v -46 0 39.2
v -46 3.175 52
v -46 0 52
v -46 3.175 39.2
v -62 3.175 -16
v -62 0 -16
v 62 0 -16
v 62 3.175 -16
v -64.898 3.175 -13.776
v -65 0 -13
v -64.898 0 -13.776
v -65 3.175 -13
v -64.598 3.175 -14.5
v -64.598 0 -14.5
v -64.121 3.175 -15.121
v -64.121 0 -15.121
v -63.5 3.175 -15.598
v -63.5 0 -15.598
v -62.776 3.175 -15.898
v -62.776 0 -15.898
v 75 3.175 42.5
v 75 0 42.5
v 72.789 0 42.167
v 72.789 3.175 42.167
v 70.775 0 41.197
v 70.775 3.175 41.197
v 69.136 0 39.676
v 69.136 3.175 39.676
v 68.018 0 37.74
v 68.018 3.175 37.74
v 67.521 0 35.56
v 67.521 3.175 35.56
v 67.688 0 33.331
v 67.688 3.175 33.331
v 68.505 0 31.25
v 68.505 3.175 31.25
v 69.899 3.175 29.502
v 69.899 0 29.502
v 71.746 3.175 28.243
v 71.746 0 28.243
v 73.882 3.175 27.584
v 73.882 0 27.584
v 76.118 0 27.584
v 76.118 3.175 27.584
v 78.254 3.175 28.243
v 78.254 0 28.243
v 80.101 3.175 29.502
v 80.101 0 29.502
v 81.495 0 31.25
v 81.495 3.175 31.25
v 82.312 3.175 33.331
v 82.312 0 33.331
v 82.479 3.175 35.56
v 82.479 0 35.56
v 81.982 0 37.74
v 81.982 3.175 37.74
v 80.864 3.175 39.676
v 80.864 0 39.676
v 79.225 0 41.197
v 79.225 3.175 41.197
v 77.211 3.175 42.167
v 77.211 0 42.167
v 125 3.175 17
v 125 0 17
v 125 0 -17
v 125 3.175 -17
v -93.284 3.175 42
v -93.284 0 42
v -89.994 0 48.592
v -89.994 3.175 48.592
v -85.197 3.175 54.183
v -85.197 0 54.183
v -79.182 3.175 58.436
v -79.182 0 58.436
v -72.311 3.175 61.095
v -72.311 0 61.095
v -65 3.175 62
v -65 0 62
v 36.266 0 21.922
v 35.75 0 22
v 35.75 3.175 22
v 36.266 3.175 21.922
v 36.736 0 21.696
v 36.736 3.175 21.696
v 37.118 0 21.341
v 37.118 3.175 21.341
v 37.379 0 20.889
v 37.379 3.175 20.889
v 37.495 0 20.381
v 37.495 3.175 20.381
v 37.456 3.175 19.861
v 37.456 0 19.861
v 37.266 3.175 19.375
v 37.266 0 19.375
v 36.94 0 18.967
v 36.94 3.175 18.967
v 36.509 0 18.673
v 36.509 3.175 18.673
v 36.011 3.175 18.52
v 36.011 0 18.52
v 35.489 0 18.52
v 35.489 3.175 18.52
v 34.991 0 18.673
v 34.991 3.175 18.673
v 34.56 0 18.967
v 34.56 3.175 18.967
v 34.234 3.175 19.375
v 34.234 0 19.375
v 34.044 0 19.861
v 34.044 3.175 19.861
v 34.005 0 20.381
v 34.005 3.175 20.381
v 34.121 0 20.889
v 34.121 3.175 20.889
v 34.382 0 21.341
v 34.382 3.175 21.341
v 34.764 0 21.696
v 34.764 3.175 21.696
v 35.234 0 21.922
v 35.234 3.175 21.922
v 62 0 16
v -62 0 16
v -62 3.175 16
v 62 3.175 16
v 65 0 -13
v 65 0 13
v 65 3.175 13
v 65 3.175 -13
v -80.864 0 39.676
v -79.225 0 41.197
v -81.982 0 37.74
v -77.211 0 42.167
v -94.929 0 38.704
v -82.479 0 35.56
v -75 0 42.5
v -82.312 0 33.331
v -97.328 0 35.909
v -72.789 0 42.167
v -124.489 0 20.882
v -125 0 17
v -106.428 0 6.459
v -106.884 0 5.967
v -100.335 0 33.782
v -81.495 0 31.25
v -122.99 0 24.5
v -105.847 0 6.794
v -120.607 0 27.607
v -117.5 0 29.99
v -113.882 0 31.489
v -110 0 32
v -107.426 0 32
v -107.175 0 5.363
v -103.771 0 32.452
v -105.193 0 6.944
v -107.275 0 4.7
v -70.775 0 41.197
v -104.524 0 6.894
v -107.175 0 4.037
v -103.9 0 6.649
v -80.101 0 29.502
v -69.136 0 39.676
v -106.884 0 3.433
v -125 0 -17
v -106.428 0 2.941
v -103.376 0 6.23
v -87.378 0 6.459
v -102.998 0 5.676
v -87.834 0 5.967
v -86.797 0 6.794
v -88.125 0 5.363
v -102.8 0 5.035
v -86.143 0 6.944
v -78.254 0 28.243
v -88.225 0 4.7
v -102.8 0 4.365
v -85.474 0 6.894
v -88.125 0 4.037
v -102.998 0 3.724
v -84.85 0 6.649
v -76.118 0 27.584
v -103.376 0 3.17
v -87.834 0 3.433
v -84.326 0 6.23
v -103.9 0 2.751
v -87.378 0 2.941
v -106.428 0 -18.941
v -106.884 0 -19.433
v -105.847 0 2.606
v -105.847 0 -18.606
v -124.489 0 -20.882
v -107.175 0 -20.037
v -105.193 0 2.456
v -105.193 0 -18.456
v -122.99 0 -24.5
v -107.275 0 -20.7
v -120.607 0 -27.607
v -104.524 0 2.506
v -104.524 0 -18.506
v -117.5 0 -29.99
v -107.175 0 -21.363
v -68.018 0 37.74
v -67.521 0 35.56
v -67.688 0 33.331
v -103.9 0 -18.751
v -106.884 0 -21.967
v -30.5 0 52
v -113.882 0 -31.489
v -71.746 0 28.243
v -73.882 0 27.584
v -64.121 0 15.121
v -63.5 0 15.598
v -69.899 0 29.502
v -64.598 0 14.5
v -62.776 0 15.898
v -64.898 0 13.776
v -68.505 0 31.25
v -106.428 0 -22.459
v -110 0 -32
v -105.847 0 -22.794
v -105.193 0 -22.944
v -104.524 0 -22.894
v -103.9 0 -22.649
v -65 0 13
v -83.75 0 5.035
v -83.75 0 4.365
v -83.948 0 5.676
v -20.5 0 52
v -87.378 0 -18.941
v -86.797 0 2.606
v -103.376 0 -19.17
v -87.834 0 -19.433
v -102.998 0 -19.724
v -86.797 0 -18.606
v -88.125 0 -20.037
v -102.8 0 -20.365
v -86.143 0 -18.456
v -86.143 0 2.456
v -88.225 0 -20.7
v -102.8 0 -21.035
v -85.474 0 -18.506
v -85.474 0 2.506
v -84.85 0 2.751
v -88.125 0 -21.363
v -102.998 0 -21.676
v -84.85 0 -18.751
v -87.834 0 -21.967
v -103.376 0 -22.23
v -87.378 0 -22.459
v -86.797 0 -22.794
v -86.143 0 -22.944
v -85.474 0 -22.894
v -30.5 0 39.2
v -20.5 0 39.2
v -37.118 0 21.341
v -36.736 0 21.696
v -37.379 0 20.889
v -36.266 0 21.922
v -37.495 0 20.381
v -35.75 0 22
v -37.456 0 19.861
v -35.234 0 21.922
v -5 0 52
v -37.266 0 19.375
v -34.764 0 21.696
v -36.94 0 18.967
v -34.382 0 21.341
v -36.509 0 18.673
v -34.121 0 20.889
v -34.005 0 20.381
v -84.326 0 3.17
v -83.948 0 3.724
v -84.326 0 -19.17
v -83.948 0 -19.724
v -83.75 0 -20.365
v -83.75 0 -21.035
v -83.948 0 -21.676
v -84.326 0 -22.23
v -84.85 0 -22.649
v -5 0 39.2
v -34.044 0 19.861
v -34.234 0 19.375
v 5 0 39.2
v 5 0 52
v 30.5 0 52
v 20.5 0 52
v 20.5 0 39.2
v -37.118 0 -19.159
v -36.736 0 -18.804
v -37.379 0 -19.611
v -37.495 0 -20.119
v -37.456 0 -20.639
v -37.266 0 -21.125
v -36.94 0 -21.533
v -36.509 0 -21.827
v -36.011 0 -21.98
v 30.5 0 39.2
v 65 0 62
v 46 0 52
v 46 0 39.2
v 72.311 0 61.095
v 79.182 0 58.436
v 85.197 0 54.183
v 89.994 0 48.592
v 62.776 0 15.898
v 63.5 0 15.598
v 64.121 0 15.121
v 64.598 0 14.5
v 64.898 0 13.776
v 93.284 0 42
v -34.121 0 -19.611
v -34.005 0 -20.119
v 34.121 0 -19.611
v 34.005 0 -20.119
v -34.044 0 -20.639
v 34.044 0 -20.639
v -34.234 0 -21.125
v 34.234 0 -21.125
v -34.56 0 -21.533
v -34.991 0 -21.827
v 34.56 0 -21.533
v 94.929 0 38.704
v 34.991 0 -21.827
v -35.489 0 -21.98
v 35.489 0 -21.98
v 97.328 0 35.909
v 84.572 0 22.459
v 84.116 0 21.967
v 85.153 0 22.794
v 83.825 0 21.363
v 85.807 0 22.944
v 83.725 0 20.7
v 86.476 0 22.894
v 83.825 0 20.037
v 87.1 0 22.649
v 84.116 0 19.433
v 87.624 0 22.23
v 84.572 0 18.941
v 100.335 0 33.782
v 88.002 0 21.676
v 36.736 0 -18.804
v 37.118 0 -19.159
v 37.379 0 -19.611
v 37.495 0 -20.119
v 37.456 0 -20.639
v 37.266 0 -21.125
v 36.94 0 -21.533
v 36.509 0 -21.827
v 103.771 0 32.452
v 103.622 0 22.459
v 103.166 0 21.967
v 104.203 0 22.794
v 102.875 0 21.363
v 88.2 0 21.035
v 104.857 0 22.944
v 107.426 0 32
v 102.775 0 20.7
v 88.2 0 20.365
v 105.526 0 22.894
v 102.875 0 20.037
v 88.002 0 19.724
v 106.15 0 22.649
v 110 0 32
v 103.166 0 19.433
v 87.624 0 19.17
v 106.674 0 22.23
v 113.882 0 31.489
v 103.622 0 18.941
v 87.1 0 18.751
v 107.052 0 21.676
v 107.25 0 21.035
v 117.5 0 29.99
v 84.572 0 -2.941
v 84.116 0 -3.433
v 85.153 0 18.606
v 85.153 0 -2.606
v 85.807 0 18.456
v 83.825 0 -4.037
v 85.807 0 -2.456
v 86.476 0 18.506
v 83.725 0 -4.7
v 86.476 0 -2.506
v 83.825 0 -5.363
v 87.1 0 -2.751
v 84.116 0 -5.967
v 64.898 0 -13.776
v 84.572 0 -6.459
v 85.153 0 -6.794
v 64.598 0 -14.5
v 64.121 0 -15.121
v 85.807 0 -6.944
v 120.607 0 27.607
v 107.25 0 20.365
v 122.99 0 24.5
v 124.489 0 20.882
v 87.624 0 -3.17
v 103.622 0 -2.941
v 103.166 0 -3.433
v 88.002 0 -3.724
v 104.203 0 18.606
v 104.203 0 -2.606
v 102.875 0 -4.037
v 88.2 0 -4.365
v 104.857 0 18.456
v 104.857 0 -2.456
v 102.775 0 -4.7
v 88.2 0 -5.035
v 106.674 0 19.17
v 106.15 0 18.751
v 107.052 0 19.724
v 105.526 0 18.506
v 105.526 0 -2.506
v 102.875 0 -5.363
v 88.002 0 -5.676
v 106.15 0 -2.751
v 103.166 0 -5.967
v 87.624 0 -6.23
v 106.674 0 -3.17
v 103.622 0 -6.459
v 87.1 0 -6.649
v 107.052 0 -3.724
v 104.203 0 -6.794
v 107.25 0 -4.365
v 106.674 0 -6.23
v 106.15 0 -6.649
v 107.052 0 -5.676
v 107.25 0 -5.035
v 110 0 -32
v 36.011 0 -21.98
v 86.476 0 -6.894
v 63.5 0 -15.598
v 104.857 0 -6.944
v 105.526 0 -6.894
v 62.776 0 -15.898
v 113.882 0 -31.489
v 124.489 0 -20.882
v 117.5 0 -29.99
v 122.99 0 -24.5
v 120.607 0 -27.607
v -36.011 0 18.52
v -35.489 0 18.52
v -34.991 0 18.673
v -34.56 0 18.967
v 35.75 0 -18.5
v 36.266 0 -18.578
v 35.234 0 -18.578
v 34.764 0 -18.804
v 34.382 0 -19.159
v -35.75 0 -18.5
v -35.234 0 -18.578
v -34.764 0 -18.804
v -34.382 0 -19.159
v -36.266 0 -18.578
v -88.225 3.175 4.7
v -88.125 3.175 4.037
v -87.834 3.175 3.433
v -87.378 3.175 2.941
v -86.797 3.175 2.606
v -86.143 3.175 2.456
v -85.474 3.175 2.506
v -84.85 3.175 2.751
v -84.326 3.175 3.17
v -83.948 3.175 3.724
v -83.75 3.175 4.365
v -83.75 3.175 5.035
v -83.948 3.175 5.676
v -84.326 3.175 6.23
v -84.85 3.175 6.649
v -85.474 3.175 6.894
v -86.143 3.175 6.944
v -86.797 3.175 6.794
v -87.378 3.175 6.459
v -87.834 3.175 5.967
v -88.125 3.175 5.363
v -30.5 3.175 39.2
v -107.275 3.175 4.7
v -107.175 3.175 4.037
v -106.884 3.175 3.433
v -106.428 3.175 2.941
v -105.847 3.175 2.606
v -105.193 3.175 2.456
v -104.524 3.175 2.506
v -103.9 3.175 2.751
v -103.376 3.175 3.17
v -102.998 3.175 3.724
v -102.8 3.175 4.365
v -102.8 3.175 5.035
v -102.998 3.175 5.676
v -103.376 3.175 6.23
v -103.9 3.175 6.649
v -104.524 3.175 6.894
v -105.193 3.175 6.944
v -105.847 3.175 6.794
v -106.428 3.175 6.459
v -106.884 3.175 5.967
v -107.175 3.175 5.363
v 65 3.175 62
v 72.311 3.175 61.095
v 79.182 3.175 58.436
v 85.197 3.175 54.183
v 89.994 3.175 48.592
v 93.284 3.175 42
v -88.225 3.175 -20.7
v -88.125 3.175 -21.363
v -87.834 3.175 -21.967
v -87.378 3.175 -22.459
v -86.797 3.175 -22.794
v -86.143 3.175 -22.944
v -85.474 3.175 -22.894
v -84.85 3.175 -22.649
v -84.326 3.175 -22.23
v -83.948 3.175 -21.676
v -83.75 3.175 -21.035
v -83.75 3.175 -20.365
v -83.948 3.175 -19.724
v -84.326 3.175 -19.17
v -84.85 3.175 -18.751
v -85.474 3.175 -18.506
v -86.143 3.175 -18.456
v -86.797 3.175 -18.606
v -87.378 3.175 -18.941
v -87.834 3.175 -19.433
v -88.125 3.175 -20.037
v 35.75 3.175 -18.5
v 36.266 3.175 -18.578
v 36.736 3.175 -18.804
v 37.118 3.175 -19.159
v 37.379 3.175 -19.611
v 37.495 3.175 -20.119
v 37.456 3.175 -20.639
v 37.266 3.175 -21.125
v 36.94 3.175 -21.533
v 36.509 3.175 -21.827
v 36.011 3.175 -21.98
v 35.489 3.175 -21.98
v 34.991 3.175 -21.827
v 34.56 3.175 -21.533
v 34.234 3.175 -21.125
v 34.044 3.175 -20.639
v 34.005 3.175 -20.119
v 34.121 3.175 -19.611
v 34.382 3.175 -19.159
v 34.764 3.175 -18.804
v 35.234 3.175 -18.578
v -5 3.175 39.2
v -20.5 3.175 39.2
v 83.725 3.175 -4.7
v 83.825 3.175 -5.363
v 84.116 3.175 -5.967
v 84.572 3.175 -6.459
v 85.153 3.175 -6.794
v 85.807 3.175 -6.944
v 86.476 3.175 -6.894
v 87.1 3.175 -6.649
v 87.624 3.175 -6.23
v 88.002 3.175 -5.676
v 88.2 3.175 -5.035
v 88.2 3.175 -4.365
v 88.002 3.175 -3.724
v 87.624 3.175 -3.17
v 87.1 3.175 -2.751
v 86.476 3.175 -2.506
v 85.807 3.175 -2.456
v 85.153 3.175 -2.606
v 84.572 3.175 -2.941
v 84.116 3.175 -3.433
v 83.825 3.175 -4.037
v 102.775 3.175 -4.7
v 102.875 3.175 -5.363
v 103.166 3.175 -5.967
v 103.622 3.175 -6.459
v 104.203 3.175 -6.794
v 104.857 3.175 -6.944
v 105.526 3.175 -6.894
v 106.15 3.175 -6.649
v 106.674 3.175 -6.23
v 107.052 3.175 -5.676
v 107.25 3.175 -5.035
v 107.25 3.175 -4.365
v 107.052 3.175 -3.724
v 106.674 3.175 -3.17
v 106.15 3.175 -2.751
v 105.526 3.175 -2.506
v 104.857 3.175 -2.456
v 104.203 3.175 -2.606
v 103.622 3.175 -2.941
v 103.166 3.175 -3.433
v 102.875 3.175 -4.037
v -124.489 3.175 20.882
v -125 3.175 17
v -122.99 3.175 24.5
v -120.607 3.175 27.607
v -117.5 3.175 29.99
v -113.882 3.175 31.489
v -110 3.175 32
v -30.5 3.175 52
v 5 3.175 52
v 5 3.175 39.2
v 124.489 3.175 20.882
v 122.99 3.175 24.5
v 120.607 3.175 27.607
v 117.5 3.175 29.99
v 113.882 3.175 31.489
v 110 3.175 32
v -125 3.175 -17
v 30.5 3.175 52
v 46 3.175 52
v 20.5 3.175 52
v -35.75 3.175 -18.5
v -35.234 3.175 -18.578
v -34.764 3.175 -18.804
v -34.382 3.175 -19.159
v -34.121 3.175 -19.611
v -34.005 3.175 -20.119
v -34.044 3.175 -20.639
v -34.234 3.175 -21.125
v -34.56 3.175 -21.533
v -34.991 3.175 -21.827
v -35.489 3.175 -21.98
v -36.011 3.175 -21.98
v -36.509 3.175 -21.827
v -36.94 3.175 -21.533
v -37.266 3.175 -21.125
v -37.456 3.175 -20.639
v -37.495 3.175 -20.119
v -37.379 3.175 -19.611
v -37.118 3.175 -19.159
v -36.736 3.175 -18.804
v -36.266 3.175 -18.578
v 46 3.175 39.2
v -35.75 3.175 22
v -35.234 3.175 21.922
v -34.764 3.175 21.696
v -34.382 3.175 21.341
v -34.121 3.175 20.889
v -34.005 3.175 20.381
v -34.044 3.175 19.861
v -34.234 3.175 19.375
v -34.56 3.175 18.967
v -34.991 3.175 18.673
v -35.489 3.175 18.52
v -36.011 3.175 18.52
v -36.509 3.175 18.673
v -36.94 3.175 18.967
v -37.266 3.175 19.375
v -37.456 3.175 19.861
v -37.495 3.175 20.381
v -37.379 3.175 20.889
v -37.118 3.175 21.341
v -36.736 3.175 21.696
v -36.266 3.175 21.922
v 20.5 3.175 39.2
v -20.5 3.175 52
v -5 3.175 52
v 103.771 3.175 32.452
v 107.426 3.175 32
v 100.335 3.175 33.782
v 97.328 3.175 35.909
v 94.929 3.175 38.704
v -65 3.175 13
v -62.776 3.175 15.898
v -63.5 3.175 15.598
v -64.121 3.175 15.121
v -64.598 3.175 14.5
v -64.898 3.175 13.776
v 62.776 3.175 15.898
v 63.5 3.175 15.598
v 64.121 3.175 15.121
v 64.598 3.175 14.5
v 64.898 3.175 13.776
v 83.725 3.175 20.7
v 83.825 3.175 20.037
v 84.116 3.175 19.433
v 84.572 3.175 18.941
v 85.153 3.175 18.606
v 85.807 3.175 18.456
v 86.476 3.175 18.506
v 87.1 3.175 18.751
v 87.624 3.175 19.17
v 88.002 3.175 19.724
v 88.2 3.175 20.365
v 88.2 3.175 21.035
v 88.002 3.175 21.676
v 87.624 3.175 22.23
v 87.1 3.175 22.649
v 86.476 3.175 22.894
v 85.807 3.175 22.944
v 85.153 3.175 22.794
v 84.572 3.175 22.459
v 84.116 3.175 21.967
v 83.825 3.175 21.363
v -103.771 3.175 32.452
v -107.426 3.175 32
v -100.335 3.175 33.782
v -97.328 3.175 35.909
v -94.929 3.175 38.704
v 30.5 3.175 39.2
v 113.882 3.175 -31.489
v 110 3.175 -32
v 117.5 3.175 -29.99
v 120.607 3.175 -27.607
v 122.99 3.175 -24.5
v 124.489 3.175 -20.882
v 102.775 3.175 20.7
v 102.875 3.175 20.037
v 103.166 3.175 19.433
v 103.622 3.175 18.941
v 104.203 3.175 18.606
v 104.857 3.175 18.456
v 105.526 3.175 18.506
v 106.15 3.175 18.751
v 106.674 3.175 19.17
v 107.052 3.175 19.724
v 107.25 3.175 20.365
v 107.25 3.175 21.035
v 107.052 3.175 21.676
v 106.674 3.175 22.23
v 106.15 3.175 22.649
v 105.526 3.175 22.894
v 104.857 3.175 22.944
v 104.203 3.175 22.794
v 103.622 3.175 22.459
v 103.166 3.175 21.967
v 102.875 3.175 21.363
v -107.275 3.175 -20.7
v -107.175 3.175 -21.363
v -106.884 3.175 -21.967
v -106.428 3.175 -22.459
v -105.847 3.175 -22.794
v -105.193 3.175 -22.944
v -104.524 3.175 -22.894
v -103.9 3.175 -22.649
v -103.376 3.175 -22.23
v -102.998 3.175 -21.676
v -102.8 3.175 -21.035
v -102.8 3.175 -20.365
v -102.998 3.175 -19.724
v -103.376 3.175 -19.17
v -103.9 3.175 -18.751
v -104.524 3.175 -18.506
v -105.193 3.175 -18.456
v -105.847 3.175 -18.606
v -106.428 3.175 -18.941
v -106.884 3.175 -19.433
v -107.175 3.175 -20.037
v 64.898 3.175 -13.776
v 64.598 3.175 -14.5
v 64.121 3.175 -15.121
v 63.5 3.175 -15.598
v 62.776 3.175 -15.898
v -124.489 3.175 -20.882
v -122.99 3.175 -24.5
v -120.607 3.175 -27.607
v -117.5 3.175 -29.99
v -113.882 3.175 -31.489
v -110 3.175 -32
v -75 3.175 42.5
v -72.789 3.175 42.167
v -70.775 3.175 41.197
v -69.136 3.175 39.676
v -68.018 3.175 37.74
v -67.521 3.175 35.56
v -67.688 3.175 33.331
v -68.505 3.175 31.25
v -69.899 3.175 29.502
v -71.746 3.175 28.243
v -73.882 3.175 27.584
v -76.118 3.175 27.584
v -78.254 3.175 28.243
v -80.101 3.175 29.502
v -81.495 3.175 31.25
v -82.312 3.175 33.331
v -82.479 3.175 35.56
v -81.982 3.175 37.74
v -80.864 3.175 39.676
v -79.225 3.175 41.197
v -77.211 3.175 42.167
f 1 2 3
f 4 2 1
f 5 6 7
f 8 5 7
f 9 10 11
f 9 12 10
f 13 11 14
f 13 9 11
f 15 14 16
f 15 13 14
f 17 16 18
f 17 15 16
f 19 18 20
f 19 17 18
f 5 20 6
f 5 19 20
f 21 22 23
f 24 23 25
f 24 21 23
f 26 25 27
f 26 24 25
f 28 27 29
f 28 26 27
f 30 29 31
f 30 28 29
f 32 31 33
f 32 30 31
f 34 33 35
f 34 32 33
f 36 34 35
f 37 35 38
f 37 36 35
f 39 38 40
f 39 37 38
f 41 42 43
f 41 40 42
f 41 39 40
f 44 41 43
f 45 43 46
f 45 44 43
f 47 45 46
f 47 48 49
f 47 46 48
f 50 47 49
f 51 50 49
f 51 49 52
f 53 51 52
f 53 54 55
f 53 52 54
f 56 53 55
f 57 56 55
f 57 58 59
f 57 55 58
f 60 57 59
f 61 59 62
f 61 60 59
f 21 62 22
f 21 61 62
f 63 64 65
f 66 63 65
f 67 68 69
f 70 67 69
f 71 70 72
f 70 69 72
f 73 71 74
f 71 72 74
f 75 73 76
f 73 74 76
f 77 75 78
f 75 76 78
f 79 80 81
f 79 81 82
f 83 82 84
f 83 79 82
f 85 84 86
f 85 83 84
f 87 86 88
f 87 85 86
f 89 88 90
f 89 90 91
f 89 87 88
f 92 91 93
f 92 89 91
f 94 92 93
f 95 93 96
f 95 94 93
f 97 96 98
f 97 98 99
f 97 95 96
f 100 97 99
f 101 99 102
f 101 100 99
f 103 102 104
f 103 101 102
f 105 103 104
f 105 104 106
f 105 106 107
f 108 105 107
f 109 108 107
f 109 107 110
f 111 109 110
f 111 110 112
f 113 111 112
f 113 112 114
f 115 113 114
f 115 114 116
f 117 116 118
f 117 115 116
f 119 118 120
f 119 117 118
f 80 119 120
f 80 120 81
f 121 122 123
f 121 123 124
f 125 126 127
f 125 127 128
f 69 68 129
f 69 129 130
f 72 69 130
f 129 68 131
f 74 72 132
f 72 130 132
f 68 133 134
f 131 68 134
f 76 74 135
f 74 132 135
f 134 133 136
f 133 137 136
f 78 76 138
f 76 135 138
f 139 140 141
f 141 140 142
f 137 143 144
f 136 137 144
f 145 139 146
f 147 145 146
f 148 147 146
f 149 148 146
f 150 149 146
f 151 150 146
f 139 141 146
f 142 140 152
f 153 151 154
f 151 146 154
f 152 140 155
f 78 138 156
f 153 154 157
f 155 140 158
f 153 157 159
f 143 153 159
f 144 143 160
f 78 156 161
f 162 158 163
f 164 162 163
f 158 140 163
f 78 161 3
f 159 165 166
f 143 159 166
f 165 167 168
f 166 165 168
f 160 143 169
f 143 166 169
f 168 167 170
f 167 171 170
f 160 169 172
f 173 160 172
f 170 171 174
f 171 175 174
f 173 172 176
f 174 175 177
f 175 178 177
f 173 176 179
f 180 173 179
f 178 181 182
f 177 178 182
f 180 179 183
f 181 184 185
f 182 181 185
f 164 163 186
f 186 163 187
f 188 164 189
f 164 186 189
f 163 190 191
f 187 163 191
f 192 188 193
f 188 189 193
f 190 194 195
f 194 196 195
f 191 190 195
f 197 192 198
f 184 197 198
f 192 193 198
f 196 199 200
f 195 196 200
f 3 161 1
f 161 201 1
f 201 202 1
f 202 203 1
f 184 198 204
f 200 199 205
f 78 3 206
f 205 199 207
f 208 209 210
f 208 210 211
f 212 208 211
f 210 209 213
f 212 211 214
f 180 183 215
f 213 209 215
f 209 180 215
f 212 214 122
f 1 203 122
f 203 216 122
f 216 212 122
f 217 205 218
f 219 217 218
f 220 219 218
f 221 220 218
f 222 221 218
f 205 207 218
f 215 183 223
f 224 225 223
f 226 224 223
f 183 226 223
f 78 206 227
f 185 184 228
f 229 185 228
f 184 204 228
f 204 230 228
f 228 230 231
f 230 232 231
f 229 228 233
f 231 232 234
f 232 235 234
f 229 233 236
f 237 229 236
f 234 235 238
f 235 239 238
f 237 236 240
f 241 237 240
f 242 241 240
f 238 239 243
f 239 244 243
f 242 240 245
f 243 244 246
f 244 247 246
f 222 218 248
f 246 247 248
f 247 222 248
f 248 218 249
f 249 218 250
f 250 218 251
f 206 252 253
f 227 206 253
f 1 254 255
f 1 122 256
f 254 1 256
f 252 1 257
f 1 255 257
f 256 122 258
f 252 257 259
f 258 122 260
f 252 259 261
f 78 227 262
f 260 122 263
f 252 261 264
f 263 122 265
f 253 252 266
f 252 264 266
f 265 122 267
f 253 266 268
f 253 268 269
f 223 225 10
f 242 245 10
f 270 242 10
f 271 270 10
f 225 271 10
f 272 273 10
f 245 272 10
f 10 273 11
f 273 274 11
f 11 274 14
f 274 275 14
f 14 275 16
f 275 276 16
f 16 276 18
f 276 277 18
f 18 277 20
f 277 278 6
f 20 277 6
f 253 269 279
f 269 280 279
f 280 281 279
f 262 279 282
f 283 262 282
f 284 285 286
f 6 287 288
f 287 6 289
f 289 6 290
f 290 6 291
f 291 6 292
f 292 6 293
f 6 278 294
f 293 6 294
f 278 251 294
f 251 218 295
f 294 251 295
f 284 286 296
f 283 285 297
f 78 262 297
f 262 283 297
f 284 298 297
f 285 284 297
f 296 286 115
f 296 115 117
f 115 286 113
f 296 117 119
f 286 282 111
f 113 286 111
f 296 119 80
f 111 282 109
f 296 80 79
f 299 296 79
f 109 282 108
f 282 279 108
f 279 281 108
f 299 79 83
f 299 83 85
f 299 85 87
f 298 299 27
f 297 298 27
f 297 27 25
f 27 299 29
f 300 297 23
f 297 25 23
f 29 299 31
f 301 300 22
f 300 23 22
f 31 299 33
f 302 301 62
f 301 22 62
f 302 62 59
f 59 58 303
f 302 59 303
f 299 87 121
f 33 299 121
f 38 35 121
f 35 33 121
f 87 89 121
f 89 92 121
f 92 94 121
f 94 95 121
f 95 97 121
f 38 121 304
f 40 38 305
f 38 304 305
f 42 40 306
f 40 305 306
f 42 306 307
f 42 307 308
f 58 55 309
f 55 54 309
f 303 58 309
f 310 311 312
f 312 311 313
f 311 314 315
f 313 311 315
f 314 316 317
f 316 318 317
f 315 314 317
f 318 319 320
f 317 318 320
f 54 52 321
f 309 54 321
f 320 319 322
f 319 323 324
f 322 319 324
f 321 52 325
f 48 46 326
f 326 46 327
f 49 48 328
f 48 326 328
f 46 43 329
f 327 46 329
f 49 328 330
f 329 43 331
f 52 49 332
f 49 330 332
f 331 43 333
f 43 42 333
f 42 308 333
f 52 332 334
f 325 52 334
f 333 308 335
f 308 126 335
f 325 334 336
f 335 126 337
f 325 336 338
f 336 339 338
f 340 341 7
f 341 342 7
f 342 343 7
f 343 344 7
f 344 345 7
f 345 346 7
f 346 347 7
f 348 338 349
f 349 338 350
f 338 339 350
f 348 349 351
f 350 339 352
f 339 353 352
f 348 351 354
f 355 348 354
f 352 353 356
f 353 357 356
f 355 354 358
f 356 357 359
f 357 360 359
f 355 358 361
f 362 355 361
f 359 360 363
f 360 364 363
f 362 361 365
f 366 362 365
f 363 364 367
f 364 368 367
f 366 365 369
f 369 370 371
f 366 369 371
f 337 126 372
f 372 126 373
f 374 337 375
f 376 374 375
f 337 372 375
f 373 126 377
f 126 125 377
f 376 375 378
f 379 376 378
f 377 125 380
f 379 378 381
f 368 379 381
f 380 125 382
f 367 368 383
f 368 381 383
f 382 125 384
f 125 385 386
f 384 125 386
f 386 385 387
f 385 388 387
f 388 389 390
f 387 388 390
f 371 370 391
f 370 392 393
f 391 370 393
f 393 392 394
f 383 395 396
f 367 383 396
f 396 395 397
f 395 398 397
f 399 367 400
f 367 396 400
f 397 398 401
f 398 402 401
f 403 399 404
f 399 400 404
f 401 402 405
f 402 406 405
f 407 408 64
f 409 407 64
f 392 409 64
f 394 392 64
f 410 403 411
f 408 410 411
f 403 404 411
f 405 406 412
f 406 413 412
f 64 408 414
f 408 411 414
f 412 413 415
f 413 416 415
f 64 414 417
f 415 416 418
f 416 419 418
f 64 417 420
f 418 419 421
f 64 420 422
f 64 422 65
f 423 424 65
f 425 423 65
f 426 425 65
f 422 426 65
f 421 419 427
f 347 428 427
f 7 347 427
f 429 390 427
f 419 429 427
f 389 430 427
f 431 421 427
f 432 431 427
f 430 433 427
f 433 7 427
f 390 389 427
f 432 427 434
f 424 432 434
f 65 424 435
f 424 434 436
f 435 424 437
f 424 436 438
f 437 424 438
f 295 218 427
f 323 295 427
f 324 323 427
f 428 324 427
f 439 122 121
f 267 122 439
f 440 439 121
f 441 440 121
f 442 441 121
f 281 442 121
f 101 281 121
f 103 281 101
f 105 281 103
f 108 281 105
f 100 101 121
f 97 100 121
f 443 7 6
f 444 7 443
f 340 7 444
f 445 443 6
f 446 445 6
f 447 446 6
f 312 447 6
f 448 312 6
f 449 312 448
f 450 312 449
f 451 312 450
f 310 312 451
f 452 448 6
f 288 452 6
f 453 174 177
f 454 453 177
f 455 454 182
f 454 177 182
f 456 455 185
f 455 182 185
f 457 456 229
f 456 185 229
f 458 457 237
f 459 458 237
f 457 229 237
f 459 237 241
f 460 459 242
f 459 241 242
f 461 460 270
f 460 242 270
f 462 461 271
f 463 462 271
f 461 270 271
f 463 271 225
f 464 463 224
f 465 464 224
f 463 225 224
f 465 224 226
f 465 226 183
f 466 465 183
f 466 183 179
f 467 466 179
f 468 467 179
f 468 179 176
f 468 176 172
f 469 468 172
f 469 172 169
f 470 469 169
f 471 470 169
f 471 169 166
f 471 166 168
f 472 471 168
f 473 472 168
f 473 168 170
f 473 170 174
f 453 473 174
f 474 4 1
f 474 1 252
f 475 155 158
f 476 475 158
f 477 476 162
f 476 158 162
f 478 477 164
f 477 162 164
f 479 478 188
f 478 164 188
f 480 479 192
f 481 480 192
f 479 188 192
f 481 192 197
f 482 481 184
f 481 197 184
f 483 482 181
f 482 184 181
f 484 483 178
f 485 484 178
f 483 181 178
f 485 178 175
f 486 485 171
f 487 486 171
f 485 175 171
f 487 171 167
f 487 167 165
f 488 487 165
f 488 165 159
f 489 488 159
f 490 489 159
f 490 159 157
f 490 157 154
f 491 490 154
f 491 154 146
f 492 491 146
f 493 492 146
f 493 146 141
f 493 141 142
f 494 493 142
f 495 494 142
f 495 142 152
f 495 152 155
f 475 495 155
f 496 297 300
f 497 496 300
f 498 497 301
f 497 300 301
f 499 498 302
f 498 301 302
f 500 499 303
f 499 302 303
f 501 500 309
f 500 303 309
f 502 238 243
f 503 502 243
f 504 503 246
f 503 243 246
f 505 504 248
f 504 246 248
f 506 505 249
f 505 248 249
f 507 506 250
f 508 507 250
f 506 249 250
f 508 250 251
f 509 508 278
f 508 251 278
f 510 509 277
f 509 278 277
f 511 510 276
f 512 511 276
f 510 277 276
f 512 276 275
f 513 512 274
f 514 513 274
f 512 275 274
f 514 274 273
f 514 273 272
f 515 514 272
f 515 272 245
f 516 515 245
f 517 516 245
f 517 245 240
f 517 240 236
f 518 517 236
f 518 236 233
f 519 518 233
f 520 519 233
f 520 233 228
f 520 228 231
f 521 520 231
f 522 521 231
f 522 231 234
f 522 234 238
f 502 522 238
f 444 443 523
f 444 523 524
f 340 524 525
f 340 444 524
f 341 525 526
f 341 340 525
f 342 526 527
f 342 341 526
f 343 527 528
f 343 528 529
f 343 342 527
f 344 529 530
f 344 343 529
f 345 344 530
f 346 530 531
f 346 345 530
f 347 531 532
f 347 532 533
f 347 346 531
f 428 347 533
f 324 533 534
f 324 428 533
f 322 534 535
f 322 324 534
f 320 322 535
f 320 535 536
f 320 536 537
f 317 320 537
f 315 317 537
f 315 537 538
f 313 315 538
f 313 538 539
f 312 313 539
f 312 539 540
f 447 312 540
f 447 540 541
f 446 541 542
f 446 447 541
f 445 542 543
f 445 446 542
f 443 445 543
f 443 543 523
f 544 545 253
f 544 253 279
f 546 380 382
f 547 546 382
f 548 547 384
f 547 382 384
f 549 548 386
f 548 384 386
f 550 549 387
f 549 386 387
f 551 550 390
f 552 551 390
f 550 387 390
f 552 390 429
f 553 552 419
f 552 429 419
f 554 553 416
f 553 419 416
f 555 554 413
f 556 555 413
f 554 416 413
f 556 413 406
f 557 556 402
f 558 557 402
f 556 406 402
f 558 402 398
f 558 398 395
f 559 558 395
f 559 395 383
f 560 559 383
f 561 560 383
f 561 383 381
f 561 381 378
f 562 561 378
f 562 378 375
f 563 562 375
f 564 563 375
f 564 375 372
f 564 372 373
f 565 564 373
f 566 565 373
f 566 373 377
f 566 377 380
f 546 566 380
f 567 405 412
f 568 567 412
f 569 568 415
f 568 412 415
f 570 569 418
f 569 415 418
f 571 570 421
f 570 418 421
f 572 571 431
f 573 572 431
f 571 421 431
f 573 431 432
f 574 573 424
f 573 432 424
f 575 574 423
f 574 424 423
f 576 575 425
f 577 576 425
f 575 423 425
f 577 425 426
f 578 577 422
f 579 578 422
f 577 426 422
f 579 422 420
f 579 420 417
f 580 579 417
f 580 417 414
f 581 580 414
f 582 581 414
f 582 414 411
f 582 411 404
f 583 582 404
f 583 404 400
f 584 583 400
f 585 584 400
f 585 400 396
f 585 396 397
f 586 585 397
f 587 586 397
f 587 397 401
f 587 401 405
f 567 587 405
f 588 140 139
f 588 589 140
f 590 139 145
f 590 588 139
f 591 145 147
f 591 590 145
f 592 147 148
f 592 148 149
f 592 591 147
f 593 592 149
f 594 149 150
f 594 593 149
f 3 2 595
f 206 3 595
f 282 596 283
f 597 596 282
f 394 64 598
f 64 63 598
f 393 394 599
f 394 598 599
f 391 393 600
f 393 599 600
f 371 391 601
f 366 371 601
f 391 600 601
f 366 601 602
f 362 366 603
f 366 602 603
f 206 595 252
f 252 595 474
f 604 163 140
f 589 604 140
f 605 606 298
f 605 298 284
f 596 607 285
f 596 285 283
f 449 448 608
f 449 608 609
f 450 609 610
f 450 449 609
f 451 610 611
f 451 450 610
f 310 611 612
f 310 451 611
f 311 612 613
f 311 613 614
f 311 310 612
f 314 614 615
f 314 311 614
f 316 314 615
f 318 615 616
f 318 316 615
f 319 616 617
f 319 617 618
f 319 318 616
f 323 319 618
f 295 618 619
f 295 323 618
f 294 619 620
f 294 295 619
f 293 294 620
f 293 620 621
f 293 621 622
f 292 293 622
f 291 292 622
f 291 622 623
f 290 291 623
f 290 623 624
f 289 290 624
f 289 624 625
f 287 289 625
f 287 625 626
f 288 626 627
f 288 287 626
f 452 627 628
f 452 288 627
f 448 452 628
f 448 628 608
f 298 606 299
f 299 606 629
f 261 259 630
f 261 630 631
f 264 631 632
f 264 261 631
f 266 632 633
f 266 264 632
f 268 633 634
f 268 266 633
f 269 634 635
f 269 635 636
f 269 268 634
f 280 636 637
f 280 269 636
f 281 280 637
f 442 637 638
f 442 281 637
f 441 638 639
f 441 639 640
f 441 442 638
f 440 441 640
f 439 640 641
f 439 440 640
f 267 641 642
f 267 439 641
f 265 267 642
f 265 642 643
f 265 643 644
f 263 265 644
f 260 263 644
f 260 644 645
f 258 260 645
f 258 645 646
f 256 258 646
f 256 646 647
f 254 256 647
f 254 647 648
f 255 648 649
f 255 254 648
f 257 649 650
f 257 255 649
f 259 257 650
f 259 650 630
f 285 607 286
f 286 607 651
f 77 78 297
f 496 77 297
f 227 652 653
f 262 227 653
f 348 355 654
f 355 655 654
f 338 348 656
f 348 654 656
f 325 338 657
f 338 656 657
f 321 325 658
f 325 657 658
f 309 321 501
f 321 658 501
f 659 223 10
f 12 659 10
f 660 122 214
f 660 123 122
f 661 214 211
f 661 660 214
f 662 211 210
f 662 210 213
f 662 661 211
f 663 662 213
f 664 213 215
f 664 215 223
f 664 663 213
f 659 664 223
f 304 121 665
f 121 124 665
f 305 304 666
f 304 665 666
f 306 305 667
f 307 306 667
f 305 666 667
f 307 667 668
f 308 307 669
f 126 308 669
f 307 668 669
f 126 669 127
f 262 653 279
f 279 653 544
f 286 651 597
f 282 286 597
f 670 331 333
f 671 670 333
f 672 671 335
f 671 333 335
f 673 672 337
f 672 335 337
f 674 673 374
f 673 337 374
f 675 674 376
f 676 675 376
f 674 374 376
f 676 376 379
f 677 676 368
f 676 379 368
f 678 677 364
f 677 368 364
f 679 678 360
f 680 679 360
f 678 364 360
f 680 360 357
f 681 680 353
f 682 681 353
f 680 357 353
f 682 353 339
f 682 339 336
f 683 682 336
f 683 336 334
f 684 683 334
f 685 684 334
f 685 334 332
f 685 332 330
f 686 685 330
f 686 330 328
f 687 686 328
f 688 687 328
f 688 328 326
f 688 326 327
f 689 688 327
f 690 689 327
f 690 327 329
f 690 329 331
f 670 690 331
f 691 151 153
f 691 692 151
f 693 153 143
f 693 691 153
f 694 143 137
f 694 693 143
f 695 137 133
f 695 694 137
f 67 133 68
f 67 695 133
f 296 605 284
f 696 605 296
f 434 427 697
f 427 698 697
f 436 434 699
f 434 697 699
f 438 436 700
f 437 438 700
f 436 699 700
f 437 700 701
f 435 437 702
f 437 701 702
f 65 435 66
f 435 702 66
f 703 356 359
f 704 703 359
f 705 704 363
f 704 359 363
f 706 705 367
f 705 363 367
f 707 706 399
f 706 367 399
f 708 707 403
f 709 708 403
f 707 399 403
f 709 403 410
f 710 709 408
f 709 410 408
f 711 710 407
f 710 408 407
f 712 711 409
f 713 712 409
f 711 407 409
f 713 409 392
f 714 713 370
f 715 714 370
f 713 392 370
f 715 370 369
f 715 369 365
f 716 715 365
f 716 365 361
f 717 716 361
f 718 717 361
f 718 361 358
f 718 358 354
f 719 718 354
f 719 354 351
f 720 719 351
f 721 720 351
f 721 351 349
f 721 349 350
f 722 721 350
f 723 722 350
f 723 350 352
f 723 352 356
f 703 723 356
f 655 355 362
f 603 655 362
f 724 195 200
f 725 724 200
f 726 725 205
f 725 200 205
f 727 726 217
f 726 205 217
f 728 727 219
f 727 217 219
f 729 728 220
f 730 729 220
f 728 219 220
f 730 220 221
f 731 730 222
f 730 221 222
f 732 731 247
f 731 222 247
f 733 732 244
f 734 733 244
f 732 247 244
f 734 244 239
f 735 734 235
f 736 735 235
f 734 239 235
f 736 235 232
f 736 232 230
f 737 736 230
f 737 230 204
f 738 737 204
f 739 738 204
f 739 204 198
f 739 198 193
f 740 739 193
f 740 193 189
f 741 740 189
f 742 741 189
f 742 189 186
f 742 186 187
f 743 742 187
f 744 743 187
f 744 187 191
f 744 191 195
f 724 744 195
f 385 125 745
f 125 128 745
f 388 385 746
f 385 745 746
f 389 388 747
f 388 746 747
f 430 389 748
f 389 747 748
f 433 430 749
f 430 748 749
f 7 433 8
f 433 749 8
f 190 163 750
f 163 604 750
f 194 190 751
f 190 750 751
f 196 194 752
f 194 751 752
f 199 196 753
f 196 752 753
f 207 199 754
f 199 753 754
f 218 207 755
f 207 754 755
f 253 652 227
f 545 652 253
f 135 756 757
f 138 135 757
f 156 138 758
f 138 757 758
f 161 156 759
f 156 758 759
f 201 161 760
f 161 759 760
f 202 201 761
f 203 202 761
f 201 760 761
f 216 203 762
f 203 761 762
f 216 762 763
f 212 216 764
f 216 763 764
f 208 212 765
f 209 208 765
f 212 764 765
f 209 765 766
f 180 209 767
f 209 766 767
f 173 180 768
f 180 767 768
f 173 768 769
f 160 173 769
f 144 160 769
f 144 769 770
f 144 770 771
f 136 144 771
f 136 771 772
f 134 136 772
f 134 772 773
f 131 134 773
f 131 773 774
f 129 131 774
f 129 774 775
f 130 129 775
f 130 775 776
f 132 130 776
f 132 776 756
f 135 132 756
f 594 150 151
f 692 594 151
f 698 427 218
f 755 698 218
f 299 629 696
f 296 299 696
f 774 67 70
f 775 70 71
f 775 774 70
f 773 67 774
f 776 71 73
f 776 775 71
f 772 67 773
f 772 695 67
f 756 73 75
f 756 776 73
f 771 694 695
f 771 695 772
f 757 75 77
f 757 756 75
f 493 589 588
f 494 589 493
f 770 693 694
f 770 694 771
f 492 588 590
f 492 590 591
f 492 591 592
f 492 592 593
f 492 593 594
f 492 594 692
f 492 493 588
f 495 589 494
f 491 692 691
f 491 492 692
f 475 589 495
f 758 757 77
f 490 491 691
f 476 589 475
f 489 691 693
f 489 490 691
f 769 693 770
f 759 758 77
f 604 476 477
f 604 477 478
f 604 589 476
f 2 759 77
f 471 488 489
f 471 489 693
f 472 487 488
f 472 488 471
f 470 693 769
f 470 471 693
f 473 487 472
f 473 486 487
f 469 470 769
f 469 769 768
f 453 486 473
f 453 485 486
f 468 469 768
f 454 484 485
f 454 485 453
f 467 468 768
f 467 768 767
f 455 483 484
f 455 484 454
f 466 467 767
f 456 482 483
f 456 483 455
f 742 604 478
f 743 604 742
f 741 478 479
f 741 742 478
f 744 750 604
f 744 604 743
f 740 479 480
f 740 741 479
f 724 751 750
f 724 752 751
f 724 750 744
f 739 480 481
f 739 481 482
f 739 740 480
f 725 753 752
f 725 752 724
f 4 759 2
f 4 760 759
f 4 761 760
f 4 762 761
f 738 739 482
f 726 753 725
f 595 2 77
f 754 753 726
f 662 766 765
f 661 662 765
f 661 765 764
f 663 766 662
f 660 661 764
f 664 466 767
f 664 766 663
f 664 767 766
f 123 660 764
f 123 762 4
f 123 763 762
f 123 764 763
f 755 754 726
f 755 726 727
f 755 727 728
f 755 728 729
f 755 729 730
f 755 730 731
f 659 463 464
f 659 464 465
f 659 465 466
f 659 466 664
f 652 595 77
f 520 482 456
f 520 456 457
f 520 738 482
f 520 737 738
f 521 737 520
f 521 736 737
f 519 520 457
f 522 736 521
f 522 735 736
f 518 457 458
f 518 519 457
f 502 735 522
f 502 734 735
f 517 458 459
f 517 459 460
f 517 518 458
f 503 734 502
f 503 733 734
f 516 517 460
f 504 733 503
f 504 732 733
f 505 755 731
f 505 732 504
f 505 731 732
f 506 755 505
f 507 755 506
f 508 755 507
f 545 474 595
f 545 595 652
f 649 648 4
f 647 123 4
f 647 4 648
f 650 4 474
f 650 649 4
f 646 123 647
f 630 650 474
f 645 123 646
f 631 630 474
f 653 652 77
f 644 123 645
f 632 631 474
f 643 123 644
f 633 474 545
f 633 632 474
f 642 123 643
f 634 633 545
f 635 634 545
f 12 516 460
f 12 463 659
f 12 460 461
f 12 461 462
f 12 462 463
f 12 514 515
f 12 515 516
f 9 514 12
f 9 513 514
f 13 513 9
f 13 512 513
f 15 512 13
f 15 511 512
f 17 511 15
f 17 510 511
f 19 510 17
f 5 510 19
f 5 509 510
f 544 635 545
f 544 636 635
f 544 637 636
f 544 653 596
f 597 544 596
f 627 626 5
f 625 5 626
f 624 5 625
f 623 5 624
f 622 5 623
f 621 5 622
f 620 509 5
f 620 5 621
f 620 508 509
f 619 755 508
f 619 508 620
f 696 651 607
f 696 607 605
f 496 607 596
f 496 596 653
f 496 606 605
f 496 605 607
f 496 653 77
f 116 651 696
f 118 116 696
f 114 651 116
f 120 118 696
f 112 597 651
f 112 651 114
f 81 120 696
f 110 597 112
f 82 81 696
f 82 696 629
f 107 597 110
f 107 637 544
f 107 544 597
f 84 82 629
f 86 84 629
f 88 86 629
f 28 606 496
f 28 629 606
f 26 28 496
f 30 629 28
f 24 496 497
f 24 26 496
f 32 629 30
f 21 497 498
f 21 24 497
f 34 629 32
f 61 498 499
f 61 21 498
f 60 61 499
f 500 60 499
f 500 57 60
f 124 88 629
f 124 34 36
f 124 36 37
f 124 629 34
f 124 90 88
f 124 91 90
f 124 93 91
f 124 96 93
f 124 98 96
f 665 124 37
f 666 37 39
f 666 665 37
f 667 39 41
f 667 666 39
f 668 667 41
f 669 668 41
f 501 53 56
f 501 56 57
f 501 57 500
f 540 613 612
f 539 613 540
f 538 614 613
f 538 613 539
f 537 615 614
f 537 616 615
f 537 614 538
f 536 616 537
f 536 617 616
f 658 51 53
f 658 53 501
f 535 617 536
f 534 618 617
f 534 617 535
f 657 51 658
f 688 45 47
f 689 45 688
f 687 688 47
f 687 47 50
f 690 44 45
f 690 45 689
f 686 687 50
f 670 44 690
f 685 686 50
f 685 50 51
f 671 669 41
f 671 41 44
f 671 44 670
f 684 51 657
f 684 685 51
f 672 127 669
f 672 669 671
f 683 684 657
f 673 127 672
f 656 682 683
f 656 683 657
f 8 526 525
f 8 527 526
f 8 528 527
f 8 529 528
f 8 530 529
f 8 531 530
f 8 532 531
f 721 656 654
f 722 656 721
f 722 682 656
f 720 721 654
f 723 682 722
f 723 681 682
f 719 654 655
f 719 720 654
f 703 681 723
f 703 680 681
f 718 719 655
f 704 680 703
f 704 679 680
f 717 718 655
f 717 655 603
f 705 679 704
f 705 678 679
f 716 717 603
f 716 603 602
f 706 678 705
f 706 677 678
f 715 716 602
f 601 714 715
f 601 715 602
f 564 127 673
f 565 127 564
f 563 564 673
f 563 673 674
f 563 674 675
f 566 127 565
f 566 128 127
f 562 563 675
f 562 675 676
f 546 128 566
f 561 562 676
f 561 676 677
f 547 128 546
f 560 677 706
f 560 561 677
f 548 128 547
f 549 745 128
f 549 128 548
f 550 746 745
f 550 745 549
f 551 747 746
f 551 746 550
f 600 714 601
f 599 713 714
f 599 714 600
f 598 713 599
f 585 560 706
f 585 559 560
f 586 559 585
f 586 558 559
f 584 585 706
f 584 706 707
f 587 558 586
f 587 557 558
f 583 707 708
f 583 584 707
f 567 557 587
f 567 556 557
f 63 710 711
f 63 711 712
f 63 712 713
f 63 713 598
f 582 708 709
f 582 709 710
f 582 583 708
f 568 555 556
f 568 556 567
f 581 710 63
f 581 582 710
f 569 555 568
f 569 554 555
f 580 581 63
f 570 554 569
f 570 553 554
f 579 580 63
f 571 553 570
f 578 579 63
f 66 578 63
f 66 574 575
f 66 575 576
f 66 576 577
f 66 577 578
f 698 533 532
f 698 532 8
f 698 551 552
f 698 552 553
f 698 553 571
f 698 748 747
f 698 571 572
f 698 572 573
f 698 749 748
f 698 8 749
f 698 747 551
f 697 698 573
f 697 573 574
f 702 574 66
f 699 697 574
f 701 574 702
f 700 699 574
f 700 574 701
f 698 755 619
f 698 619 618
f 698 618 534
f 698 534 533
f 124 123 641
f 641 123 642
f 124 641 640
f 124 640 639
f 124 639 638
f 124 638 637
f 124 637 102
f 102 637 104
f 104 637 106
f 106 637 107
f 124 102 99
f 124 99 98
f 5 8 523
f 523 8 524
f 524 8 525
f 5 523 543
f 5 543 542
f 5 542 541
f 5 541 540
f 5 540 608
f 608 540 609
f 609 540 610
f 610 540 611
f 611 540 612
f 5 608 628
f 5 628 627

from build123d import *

# Parameters (mm, degrees)
SKETCH3_W            = 130
SKETCH3_H            = 32
SKETCH3_R            = 1.75
BOSS_EXTRUDE1_DEPTH  = 3.175
M4_CLEARANCE_HOLE1_D = 4.5
FILLET1_R            = 15
SKETCH6_W            = 15.5
SKETCH6_H            = 12.8
CUT_EXTRUDE1_DEPTH   = 140.56747696
SKETCH7_R            = 7.5
CUT_EXTRUDE2_DEPTH   = 140.56747696
FILLET2_R            = 3


with BuildPart() as part:
    # Sketch3 → Boss-Extrude1 (new body)
    with BuildSketch(Plane(origin=(0, 0, 0), x_dir=(1, 0, 0), z_dir=(0, 1, 0))):
        with BuildLine():
            Line((-125, 32), (-125, -32))
            Line((-125, -32), (-95, -32))
            ThreePointArc((-95, -32), (-86.213203436, -53.213203436), (-65, -62))
            Line((-65, -62), (65, -62))
            ThreePointArc((65, -62), (86.213203436, -53.213203436), (95, -32))
            Line((95, -32), (125, -32))
            Line((125, -32), (125, 32))
            Line((125, 32), (-125, 32))
        make_face()
        Rectangle(SKETCH3_W, SKETCH3_H, mode=Mode.SUBTRACT)
        with Locations(Location((-35.75, 20.25, 0), (0, 0, 270))):
            Circle(SKETCH3_R, mode=Mode.SUBTRACT)
        with Locations(Location((35.75, 20.25, 0), (0, 0, 270))):
            Circle(SKETCH3_R, mode=Mode.SUBTRACT)
        with Locations(Location((-35.75, -20.25, 0), (0, 0, 270))):
            Circle(SKETCH3_R, mode=Mode.SUBTRACT)
        with Locations(Location((35.75, -20.25, 0), (0, 0, 270))):
            Circle(SKETCH3_R, mode=Mode.SUBTRACT)
    extrude(amount=BOSS_EXTRUDE1_DEPTH)

    # M4 Clearance Hole1 (through all)
    with Locations(Plane(origin=(0, 3.175, 0), x_dir=(1, 0, 0), z_dir=(0, 1, 0))):
        with Locations((-105.025, 20.7), (-85.975, 20.7), (-105.025, -4.7), (-85.975, -4.7), (85.975, 4.7), (105.025, 4.7), (105.025, -20.7), (85.975, -20.7)):
            Hole(M4_CLEARANCE_HOLE1_D / 2)

    # Fillet1
    fillet1_edges = [part.edges().sort_by_distance(p)[0] for p in [
        (-125, 1.5875, 32),
        (-125, 1.5875, -32),
        (125, 1.5875, -32),
        (125, 1.5875, 32),
        (95, 1.5875, 32),
        (-95, 1.5875, 32),
    ]]
    fillet(fillet1_edges, radius=FILLET1_R)

    # Sketch6 → Cut-Extrude1 (cut, through all)
    with BuildSketch(Plane(origin=(0, 3.175, 0), x_dir=(1, 0, 0), z_dir=(0, 1, 0))):
        with Locations((-38.25, -45.6)):
            Rectangle(SKETCH6_W, SKETCH6_H)
        with Locations((-12.75, -45.6)):
            Rectangle(SKETCH6_W, SKETCH6_H)
    cut_extrude1 = extrude(amount=-CUT_EXTRUDE1_DEPTH, mode=Mode.SUBTRACT)

    # Sketch7 → Cut-Extrude2 (cut, through all)
    with BuildSketch(Plane(origin=(0, 3.175, 0), x_dir=(1, 0, 0), z_dir=(0, 1, 0))):
        with Locations(Location((-75, -35, 0), (0, 0, 270))):
            Circle(SKETCH7_R)
    cut_extrude2 = extrude(amount=-CUT_EXTRUDE2_DEPTH, mode=Mode.SUBTRACT)

    # Mirror1: Cut-Extrude1, Cut-Extrude2 across plane
    add(cut_extrude1.mirror(Plane(origin=(0, 0, 0), x_dir=(0, 0, 1), z_dir=(1, 0, 0))), mode=Mode.SUBTRACT)
    add(cut_extrude2.mirror(Plane(origin=(0, 0, 0), x_dir=(0, 0, 1), z_dir=(1, 0, 0))), mode=Mode.SUBTRACT)

    # Fillet2
    fillet2_edges = [part.edges().sort_by_distance(p)[0] for p in [
        (65, 1.5875, 16),
        (65, 1.5875, -16),
        (-65, 1.5875, -16),
        (-65, 1.5875, 16),
    ]]
    fillet(fillet2_edges, radius=FILLET2_R)


solid = part.part
